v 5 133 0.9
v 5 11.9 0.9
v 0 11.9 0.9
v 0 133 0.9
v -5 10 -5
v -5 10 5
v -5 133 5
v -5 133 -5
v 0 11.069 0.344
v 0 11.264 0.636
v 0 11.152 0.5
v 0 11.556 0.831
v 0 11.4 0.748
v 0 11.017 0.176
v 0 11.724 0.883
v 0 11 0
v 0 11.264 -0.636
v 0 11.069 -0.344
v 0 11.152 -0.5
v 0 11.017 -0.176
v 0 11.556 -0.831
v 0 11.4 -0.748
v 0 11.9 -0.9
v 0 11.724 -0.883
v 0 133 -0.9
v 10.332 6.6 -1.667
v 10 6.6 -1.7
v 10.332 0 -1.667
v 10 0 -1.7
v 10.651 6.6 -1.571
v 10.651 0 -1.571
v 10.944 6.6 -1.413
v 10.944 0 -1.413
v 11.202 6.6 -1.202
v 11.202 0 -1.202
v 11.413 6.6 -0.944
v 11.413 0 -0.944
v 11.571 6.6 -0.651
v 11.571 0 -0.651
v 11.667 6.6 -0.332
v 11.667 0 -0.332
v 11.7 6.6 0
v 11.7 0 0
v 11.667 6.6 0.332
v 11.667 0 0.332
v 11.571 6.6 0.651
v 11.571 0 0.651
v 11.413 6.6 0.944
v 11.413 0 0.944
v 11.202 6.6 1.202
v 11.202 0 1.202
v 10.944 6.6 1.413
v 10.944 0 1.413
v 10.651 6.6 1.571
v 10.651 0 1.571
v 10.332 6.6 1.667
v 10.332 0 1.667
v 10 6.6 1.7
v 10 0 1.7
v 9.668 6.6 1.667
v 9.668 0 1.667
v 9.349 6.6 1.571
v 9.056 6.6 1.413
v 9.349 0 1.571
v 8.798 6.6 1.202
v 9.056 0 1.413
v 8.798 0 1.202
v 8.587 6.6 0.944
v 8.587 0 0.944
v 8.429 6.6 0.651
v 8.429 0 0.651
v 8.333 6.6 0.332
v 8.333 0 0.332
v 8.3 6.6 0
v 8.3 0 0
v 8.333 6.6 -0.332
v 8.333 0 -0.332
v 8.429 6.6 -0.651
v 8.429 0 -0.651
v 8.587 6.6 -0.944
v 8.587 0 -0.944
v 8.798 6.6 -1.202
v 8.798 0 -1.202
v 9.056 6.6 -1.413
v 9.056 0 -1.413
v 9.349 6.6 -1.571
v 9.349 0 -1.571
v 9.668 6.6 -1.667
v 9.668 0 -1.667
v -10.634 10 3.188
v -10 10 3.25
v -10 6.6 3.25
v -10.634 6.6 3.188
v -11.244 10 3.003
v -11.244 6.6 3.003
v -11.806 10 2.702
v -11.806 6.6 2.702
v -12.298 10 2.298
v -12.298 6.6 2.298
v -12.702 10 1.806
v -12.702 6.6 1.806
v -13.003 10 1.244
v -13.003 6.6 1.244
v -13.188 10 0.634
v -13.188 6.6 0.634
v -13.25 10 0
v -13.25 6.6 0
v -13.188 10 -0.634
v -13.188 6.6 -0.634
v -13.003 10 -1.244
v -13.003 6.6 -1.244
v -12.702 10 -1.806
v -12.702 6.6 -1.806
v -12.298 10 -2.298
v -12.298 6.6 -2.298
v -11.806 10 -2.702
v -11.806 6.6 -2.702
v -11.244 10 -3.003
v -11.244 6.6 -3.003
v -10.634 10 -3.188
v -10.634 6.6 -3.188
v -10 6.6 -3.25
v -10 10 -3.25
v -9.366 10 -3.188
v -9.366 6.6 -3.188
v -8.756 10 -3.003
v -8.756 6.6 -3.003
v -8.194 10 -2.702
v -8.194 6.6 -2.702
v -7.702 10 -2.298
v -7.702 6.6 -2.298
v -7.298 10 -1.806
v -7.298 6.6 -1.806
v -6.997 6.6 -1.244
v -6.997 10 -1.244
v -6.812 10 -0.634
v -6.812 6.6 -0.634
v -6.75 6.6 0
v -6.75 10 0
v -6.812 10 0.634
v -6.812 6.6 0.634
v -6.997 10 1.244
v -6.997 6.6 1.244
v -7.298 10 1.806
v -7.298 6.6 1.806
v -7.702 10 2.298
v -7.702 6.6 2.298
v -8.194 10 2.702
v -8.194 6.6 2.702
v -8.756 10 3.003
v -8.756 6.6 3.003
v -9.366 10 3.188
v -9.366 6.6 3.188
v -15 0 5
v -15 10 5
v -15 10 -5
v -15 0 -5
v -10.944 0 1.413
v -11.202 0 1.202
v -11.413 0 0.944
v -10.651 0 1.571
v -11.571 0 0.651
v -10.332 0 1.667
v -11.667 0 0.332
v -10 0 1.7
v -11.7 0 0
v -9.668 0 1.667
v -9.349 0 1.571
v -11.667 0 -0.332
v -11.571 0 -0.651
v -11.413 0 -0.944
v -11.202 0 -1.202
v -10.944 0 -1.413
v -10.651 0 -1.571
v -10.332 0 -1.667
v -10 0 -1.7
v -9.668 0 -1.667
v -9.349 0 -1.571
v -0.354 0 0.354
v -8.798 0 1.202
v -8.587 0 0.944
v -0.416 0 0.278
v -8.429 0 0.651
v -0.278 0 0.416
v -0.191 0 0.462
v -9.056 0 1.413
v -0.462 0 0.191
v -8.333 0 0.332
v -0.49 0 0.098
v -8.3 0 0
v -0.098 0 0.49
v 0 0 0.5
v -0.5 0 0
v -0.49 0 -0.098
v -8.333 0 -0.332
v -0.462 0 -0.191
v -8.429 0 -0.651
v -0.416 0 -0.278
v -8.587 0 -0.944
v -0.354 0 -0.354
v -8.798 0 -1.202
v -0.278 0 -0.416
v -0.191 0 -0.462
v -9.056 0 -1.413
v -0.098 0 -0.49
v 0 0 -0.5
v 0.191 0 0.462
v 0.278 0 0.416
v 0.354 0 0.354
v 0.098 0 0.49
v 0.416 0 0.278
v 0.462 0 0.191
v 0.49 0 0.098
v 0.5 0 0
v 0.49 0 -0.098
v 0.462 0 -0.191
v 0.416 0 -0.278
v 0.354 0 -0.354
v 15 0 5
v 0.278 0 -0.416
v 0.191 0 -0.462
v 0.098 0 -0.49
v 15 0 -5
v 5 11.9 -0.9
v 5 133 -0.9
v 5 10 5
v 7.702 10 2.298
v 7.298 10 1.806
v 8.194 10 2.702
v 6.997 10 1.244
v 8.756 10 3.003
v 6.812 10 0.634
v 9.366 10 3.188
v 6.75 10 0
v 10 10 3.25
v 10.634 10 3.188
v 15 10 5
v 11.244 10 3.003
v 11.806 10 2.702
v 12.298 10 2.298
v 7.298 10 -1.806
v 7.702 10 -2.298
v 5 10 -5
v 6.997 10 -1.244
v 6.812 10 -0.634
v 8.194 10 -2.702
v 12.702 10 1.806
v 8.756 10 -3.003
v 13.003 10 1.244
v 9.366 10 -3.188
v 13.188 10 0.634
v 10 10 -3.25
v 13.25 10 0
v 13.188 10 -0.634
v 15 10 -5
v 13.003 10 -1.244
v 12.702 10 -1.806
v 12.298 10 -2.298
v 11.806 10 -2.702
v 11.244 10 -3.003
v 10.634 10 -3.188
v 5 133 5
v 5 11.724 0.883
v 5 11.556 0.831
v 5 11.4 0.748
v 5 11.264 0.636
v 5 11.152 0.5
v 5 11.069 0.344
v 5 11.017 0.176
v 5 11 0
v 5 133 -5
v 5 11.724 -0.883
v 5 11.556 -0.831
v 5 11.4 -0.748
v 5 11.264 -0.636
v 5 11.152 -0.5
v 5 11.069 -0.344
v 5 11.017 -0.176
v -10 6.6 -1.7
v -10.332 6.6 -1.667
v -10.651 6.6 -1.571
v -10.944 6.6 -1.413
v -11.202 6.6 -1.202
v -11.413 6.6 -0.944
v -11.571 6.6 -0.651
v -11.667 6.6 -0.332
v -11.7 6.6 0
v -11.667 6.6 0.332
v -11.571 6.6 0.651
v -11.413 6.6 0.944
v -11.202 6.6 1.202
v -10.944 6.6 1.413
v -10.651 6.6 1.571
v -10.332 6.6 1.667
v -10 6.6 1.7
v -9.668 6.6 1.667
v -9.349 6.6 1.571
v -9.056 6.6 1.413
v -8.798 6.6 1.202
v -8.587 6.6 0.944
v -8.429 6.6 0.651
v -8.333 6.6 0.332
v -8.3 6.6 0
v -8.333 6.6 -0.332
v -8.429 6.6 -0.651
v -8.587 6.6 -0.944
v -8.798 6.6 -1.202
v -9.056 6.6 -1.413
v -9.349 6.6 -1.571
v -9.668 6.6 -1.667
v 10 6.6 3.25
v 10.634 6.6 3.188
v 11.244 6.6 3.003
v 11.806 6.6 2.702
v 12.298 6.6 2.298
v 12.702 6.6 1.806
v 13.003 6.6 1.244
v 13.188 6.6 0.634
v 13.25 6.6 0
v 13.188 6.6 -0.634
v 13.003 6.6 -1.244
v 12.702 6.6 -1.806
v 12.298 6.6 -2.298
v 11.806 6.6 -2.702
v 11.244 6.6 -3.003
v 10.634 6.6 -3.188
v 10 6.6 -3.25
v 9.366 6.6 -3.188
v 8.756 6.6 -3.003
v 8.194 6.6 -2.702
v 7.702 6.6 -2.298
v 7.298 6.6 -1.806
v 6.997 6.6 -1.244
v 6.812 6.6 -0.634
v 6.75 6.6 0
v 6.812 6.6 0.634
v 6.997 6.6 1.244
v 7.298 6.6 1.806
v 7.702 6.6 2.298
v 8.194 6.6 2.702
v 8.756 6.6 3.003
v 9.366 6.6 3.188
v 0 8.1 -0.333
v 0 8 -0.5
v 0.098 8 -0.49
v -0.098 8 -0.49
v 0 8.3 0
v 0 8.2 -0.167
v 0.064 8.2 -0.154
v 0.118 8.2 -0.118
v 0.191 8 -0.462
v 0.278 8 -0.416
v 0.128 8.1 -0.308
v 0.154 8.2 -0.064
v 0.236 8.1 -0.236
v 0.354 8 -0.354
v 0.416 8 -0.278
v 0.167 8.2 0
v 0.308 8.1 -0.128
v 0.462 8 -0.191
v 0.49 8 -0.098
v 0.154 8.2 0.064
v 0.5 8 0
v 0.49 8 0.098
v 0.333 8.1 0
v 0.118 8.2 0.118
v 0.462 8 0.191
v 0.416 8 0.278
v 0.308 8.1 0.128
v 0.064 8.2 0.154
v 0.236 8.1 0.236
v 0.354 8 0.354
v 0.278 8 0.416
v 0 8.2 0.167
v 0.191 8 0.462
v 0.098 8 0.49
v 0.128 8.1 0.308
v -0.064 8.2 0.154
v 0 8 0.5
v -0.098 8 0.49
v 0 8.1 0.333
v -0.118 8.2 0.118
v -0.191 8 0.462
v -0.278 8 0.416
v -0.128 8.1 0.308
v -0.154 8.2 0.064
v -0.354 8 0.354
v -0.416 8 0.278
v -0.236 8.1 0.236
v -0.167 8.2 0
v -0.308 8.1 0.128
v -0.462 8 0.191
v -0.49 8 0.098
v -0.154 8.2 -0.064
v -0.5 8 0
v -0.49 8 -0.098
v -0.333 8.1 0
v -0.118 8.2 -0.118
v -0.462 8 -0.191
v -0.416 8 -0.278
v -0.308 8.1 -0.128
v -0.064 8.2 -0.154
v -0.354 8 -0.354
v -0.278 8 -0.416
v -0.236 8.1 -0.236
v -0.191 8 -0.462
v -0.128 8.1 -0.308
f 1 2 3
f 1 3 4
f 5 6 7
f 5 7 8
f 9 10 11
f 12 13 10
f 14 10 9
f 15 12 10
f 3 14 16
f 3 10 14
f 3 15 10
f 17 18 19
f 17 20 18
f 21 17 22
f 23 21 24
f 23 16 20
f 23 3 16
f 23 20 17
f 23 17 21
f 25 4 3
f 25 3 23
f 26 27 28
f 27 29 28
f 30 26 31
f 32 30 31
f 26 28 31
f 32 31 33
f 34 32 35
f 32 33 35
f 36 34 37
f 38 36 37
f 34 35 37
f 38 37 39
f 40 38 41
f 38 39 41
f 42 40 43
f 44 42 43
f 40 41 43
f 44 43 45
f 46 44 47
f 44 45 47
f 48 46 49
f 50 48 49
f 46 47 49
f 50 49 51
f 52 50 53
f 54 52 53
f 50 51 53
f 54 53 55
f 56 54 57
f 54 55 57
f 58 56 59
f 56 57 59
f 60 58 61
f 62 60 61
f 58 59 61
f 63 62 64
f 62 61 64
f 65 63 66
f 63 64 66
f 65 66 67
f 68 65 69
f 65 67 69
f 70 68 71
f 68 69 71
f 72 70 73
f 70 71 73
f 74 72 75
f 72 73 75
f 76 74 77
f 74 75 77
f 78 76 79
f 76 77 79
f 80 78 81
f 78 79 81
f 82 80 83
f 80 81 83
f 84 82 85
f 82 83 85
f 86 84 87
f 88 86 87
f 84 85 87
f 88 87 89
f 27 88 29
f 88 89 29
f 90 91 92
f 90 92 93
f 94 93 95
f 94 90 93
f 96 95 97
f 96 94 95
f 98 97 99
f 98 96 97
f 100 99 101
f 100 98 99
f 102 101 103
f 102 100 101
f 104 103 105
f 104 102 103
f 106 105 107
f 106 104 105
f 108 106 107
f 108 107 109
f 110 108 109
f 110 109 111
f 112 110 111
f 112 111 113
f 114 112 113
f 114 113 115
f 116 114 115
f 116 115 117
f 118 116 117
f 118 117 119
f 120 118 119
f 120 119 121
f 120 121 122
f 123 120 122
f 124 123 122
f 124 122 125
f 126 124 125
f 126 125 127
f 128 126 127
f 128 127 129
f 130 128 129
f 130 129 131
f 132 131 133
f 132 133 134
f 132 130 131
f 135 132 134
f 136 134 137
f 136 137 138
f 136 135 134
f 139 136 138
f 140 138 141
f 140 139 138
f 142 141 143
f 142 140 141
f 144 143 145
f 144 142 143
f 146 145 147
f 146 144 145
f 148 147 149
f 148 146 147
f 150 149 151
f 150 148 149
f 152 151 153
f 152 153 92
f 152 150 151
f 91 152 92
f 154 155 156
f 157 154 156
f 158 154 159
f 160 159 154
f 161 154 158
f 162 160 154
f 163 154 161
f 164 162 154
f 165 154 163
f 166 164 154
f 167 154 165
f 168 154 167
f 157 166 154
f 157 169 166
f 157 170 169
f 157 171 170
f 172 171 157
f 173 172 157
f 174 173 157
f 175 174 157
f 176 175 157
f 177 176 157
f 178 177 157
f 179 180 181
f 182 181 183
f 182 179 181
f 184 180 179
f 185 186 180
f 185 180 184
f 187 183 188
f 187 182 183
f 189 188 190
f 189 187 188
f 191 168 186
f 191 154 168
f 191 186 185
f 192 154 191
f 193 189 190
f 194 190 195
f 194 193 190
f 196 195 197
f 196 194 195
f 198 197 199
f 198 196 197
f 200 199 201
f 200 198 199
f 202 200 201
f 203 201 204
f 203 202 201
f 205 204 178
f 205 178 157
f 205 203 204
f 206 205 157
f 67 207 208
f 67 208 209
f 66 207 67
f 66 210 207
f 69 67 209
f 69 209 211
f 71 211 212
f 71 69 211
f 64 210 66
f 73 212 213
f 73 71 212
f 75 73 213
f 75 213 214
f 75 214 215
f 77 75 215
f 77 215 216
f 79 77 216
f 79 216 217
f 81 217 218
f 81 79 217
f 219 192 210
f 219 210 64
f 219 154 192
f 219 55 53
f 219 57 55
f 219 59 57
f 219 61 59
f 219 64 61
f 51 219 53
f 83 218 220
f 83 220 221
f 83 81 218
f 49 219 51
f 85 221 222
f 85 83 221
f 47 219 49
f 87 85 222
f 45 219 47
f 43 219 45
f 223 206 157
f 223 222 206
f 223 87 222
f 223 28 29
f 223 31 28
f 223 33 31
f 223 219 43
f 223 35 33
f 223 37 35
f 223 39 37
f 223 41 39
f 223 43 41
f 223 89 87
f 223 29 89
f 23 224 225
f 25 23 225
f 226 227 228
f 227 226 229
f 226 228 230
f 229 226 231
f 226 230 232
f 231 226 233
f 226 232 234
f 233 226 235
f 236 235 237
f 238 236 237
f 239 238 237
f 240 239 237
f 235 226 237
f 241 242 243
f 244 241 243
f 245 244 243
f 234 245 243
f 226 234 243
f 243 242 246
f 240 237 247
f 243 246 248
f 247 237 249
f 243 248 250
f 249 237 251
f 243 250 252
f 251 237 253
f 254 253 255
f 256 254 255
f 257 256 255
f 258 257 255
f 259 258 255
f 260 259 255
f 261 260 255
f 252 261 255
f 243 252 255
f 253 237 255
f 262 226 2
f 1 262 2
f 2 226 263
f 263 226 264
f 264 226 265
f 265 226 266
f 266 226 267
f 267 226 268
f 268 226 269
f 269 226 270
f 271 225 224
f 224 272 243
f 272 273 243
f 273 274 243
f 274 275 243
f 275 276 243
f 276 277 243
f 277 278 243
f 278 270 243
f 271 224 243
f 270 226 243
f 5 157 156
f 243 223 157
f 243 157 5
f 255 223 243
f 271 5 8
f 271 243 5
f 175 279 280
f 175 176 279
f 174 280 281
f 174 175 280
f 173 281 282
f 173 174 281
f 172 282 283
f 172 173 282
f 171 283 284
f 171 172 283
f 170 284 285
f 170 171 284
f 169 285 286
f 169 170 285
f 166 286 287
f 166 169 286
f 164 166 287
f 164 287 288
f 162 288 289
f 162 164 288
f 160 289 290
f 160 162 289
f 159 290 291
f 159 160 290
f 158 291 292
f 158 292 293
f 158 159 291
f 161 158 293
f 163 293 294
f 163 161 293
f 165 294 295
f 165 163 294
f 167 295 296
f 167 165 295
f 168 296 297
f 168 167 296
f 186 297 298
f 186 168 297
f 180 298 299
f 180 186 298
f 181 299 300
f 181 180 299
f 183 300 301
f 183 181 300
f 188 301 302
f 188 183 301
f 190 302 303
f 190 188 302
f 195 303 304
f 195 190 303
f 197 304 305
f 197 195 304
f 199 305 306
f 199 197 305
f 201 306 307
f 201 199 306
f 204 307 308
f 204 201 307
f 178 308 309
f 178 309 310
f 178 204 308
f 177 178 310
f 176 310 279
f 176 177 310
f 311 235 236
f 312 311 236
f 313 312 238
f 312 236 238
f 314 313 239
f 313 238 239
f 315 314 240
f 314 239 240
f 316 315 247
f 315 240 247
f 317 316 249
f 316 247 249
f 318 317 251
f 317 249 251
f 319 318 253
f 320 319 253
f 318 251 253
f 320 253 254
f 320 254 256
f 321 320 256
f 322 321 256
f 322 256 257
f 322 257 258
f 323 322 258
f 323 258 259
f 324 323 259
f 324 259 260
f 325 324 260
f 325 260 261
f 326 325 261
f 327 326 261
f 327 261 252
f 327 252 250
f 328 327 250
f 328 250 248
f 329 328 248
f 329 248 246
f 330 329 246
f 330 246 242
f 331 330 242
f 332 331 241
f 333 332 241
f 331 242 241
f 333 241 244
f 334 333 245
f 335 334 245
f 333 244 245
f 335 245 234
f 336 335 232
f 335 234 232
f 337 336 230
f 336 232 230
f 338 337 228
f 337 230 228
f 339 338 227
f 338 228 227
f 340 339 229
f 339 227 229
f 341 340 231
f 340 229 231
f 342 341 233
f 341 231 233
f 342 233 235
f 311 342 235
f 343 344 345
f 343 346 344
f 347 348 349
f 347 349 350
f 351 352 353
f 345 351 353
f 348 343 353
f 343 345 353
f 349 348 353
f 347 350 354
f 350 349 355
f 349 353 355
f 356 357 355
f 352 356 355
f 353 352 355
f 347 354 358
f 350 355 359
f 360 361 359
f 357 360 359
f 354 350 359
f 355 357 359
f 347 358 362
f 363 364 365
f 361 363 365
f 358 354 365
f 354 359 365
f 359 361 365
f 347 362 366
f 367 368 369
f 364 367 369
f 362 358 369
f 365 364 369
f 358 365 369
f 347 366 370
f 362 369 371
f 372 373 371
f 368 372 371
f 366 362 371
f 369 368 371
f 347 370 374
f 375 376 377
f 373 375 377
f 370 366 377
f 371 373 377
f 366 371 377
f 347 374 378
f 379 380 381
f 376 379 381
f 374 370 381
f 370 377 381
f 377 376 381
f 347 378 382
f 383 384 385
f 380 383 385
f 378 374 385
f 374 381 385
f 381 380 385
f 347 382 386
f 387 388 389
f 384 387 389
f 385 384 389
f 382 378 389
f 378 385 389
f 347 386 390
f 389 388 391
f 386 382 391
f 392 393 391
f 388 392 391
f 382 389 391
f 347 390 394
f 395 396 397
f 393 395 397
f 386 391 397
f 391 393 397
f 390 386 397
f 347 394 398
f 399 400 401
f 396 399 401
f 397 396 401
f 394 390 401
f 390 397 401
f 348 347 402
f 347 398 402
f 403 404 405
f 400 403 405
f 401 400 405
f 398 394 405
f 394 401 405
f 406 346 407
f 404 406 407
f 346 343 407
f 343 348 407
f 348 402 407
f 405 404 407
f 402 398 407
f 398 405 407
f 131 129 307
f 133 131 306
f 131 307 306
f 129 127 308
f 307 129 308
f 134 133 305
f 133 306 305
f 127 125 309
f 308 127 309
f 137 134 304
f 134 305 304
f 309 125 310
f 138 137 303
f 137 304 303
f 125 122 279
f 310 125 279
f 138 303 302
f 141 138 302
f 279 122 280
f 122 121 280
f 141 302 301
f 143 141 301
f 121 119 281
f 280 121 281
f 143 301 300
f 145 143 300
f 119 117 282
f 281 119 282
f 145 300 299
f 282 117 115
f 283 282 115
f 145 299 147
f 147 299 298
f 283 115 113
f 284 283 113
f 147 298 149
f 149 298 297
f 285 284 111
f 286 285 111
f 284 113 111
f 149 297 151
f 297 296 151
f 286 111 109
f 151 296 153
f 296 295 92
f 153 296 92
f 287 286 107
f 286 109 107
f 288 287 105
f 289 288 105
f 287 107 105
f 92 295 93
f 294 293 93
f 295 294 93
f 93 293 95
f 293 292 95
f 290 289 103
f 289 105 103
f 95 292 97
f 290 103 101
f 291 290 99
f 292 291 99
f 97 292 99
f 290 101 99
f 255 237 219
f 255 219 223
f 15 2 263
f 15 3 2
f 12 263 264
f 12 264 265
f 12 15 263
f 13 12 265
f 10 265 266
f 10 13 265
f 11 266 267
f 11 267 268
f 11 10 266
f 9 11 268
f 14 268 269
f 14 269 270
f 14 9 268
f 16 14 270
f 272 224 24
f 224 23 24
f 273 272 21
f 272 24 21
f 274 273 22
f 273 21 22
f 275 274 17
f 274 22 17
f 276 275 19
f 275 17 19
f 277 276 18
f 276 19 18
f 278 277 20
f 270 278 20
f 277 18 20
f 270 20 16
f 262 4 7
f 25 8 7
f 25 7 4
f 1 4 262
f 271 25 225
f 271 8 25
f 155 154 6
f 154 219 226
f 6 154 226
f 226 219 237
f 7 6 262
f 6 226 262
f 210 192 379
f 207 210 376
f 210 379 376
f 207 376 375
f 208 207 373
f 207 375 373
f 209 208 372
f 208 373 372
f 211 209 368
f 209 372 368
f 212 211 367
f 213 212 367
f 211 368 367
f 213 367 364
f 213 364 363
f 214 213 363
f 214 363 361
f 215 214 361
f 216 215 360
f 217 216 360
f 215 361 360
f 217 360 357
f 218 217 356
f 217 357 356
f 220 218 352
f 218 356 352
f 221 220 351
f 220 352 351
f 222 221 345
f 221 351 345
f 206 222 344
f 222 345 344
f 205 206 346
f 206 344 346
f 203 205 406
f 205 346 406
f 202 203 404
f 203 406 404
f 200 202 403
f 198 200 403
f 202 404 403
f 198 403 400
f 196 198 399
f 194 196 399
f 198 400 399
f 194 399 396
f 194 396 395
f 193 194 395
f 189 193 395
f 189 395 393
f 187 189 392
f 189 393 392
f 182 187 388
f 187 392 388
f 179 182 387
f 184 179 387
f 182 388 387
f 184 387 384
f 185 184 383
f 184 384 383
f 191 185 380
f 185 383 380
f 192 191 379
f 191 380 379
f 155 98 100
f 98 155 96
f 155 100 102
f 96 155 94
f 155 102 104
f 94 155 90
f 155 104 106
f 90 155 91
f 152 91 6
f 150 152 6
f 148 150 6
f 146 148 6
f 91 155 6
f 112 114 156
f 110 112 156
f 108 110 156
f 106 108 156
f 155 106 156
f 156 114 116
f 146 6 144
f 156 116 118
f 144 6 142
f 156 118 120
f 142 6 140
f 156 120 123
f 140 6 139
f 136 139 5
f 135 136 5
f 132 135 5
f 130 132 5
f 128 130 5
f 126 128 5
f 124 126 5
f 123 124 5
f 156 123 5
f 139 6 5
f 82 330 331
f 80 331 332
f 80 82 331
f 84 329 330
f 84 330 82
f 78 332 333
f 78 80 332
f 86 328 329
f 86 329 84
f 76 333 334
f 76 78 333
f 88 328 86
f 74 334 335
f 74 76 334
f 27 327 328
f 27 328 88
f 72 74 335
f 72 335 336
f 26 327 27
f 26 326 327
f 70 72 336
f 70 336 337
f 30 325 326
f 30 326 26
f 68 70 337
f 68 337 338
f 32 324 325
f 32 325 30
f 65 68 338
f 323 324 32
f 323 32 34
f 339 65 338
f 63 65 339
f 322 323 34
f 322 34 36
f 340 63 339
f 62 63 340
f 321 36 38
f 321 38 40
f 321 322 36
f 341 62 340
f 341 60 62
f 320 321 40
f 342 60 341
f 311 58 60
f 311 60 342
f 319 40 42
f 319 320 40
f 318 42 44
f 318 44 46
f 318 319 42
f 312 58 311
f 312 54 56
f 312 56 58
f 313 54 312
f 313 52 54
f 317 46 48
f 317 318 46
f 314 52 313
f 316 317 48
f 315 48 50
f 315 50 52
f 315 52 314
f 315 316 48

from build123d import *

# Parameters (mm, degrees)
SKETCH1_W                                           = 10
SKETCH1_H                                           = 10
BOSS_EXTRUDE1_DEPTH                                 = 133
SKETCH3_W                                           = 1.8
SKETCH3_H                                           = 122
CUT_EXTRUDE1_DEPTH                                  = 5
FILLET1_R                                           = 0.9
SKETCH4_W                                           = 10
SKETCH4_H                                           = 10
BOSS_EXTRUDE3_DEPTH                                 = 15
CBORE_FOR_M3_HEX_SOCKET_HEAD_CAP_SCREW1_D           = 3.4
CBORE_FOR_M3_HEX_SOCKET_HEAD_CAP_SCREW1_CBORE_D     = 6.5
CBORE_FOR_M3_HEX_SOCKET_HEAD_CAP_SCREW1_CBORE_DEPTH = 3.4
F_1_0MM_DOWEL_HOLE1_D                               = 1
F_1_0MM_DOWEL_HOLE1_DEPTH                           = 8
F_1_0MM_DOWEL_HOLE1_TIP                             = 0.30043031


with BuildPart() as part:
    # Sketch1 → Boss-Extrude1 (new body)
    with BuildSketch(Plane(origin=(0, 0, 0), x_dir=(1, 0, 0), z_dir=(0, 1, 0))):
        Rectangle(SKETCH1_W, SKETCH1_H)
    extrude(amount=BOSS_EXTRUDE1_DEPTH)

    # Sketch3 → Cut-Extrude1 (cut)
    with BuildSketch(Plane(origin=(5, 0, 0), x_dir=(0, 0, -1), z_dir=(1, 0, 0))):
        with Locations((0, 72)):
            Rectangle(SKETCH3_W, SKETCH3_H)
    extrude(amount=-CUT_EXTRUDE1_DEPTH, mode=Mode.SUBTRACT)

    # Fillet1
    fillet1_edges = [part.edges().sort_by_distance(p)[0] for p in [
        (2.5, 11, 0.9),
        (2.5, 11, -0.9),
    ]]
    fillet(fillet1_edges, radius=FILLET1_R - 0.0001)  # a hair under: the kernel refuses the full size

    # Sketch4 → Boss-Extrude3 (add, symmetric)
    with BuildSketch(Plane(origin=(0, 0, 0), x_dir=(0, 0, -1), z_dir=(1, 0, 0))):
        with Locations((0, 5)):
            Rectangle(SKETCH4_W, SKETCH4_H)
    extrude(amount=BOSS_EXTRUDE3_DEPTH, both=True)

    # CBORE for M3 Hex Socket Head Cap Screw1 (through all)
    with Locations(Plane(origin=(10, 10, 0), x_dir=(0, 0, 1), z_dir=(0, 1, 0))):
        with Locations((0, 0)):
            cbore_for_m3_hex_socket_head_cap_screw1 = CounterBoreHole(CBORE_FOR_M3_HEX_SOCKET_HEAD_CAP_SCREW1_D / 2, CBORE_FOR_M3_HEX_SOCKET_HEAD_CAP_SCREW1_CBORE_D / 2, CBORE_FOR_M3_HEX_SOCKET_HEAD_CAP_SCREW1_CBORE_DEPTH)

    # Mirror1: CBORE for M3 Hex Socket Head Cap Screw1 across plane
    add(cbore_for_m3_hex_socket_head_cap_screw1.mirror(Plane(origin=(0, 0, 0), x_dir=(0, 0, 1), z_dir=(1, 0, 0))), mode=Mode.SUBTRACT)

    # Ø1.0mm Dowel Hole1
    with Locations(Plane(origin=(0, 0, 0), x_dir=(0, 0, -1), z_dir=(0, -1, 0))):
        with Locations((0, 0)):
            Hole(F_1_0MM_DOWEL_HOLE1_D / 2, depth=F_1_0MM_DOWEL_HOLE1_DEPTH)
            with Locations((0, 0, -(F_1_0MM_DOWEL_HOLE1_DEPTH + F_1_0MM_DOWEL_HOLE1_TIP / 2))):  # 118° drill point
                Cone(0, F_1_0MM_DOWEL_HOLE1_D / 2, F_1_0MM_DOWEL_HOLE1_TIP, mode=Mode.SUBTRACT)


solid = part.part
